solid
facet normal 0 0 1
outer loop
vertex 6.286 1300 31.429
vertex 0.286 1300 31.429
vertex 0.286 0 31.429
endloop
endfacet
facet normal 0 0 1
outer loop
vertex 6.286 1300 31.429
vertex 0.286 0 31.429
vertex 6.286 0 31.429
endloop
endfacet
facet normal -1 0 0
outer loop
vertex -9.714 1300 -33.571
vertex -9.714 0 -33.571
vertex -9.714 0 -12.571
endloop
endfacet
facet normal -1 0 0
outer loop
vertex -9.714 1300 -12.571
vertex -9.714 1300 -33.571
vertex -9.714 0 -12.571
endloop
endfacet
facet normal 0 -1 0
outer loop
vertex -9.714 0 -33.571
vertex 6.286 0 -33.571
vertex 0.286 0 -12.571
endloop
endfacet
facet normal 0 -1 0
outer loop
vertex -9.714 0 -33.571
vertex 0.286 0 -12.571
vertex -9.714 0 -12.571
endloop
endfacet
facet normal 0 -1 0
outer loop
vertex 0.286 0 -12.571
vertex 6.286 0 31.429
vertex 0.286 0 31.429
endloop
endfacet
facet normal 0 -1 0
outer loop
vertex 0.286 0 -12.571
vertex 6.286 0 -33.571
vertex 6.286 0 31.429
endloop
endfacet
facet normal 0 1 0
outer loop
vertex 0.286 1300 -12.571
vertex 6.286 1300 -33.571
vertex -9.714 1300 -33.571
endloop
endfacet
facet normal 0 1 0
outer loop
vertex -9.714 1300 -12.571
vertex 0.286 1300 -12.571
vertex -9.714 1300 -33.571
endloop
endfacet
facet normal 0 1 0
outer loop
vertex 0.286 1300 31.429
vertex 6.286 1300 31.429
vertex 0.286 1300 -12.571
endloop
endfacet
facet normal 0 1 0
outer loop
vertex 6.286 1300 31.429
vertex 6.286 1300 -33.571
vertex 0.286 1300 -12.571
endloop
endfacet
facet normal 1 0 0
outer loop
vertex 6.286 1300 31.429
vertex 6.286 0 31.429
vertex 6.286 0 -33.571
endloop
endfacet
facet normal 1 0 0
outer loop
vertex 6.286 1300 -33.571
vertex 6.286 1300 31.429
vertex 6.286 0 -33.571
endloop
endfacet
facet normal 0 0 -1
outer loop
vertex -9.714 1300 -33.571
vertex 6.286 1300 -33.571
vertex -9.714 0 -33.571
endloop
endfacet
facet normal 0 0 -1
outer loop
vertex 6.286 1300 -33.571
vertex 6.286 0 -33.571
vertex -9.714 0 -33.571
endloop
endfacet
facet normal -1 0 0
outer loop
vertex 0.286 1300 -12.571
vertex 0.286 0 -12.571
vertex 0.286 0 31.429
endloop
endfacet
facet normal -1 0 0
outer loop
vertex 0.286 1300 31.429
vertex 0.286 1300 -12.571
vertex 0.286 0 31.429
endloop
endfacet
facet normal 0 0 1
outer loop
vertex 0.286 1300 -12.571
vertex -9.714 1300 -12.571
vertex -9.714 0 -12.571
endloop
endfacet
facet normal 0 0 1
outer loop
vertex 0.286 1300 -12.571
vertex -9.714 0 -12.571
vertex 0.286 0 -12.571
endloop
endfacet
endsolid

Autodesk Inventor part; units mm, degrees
ref_plane "YZ Plane" through (0, 0, 0) normal (1, 0, 0) x (0, 1, 0)
ref_plane "XZ Plane" through (0, 0, 0) normal (0, 1, 0) x (-1, 0, 0)
ref_plane "XY Plane" through (0, 0, 0) normal (0, 0, 1) x (1, 0, 0)
sketch "Sketch1" plane through (0, 0, 0) normal (0, 1, 0) x (-1, 0, 0)
  point P0 (0, 0)
sketch "Sketch2" plane through (0, 0, 0) normal (0, 1, 0) x (-1, 0, 0)
  line L0 (-0.2857, 31.4286) -> (-6.2857, 31.4286)
  line L1 (-6.2857, 31.4286) -> (-6.2857, -33.5714)
  line L2 (-6.2857, -33.5714) -> (-0.2857, -33.5714)
  line L3 (-0.2857, -33.5714) -> (-0.2857, 31.4286)
  line L4 (9.7143, -12.5714) -> (-0.2857, -12.5714)
  line L5 (-0.2857, -12.5714) -> (-0.2857, -33.5714)
  line L6 (-0.2857, -33.5714) -> (9.7143, -33.5714)
  line L7 (9.7143, -33.5714) -> (9.7143, -12.5714)
  point P0 (0, 0)
  point P1 (-0.2857, -12.5714)
  dimension "d0" = 44
  dimension "d1" = 6
  dimension "d2" = 10
  dimension "d3" = 65
extrude "Extrusion1" add sketch "Sketch2" along normal blind 1300
properties part number "UgolUkrep" material "Aluminum 6061"
